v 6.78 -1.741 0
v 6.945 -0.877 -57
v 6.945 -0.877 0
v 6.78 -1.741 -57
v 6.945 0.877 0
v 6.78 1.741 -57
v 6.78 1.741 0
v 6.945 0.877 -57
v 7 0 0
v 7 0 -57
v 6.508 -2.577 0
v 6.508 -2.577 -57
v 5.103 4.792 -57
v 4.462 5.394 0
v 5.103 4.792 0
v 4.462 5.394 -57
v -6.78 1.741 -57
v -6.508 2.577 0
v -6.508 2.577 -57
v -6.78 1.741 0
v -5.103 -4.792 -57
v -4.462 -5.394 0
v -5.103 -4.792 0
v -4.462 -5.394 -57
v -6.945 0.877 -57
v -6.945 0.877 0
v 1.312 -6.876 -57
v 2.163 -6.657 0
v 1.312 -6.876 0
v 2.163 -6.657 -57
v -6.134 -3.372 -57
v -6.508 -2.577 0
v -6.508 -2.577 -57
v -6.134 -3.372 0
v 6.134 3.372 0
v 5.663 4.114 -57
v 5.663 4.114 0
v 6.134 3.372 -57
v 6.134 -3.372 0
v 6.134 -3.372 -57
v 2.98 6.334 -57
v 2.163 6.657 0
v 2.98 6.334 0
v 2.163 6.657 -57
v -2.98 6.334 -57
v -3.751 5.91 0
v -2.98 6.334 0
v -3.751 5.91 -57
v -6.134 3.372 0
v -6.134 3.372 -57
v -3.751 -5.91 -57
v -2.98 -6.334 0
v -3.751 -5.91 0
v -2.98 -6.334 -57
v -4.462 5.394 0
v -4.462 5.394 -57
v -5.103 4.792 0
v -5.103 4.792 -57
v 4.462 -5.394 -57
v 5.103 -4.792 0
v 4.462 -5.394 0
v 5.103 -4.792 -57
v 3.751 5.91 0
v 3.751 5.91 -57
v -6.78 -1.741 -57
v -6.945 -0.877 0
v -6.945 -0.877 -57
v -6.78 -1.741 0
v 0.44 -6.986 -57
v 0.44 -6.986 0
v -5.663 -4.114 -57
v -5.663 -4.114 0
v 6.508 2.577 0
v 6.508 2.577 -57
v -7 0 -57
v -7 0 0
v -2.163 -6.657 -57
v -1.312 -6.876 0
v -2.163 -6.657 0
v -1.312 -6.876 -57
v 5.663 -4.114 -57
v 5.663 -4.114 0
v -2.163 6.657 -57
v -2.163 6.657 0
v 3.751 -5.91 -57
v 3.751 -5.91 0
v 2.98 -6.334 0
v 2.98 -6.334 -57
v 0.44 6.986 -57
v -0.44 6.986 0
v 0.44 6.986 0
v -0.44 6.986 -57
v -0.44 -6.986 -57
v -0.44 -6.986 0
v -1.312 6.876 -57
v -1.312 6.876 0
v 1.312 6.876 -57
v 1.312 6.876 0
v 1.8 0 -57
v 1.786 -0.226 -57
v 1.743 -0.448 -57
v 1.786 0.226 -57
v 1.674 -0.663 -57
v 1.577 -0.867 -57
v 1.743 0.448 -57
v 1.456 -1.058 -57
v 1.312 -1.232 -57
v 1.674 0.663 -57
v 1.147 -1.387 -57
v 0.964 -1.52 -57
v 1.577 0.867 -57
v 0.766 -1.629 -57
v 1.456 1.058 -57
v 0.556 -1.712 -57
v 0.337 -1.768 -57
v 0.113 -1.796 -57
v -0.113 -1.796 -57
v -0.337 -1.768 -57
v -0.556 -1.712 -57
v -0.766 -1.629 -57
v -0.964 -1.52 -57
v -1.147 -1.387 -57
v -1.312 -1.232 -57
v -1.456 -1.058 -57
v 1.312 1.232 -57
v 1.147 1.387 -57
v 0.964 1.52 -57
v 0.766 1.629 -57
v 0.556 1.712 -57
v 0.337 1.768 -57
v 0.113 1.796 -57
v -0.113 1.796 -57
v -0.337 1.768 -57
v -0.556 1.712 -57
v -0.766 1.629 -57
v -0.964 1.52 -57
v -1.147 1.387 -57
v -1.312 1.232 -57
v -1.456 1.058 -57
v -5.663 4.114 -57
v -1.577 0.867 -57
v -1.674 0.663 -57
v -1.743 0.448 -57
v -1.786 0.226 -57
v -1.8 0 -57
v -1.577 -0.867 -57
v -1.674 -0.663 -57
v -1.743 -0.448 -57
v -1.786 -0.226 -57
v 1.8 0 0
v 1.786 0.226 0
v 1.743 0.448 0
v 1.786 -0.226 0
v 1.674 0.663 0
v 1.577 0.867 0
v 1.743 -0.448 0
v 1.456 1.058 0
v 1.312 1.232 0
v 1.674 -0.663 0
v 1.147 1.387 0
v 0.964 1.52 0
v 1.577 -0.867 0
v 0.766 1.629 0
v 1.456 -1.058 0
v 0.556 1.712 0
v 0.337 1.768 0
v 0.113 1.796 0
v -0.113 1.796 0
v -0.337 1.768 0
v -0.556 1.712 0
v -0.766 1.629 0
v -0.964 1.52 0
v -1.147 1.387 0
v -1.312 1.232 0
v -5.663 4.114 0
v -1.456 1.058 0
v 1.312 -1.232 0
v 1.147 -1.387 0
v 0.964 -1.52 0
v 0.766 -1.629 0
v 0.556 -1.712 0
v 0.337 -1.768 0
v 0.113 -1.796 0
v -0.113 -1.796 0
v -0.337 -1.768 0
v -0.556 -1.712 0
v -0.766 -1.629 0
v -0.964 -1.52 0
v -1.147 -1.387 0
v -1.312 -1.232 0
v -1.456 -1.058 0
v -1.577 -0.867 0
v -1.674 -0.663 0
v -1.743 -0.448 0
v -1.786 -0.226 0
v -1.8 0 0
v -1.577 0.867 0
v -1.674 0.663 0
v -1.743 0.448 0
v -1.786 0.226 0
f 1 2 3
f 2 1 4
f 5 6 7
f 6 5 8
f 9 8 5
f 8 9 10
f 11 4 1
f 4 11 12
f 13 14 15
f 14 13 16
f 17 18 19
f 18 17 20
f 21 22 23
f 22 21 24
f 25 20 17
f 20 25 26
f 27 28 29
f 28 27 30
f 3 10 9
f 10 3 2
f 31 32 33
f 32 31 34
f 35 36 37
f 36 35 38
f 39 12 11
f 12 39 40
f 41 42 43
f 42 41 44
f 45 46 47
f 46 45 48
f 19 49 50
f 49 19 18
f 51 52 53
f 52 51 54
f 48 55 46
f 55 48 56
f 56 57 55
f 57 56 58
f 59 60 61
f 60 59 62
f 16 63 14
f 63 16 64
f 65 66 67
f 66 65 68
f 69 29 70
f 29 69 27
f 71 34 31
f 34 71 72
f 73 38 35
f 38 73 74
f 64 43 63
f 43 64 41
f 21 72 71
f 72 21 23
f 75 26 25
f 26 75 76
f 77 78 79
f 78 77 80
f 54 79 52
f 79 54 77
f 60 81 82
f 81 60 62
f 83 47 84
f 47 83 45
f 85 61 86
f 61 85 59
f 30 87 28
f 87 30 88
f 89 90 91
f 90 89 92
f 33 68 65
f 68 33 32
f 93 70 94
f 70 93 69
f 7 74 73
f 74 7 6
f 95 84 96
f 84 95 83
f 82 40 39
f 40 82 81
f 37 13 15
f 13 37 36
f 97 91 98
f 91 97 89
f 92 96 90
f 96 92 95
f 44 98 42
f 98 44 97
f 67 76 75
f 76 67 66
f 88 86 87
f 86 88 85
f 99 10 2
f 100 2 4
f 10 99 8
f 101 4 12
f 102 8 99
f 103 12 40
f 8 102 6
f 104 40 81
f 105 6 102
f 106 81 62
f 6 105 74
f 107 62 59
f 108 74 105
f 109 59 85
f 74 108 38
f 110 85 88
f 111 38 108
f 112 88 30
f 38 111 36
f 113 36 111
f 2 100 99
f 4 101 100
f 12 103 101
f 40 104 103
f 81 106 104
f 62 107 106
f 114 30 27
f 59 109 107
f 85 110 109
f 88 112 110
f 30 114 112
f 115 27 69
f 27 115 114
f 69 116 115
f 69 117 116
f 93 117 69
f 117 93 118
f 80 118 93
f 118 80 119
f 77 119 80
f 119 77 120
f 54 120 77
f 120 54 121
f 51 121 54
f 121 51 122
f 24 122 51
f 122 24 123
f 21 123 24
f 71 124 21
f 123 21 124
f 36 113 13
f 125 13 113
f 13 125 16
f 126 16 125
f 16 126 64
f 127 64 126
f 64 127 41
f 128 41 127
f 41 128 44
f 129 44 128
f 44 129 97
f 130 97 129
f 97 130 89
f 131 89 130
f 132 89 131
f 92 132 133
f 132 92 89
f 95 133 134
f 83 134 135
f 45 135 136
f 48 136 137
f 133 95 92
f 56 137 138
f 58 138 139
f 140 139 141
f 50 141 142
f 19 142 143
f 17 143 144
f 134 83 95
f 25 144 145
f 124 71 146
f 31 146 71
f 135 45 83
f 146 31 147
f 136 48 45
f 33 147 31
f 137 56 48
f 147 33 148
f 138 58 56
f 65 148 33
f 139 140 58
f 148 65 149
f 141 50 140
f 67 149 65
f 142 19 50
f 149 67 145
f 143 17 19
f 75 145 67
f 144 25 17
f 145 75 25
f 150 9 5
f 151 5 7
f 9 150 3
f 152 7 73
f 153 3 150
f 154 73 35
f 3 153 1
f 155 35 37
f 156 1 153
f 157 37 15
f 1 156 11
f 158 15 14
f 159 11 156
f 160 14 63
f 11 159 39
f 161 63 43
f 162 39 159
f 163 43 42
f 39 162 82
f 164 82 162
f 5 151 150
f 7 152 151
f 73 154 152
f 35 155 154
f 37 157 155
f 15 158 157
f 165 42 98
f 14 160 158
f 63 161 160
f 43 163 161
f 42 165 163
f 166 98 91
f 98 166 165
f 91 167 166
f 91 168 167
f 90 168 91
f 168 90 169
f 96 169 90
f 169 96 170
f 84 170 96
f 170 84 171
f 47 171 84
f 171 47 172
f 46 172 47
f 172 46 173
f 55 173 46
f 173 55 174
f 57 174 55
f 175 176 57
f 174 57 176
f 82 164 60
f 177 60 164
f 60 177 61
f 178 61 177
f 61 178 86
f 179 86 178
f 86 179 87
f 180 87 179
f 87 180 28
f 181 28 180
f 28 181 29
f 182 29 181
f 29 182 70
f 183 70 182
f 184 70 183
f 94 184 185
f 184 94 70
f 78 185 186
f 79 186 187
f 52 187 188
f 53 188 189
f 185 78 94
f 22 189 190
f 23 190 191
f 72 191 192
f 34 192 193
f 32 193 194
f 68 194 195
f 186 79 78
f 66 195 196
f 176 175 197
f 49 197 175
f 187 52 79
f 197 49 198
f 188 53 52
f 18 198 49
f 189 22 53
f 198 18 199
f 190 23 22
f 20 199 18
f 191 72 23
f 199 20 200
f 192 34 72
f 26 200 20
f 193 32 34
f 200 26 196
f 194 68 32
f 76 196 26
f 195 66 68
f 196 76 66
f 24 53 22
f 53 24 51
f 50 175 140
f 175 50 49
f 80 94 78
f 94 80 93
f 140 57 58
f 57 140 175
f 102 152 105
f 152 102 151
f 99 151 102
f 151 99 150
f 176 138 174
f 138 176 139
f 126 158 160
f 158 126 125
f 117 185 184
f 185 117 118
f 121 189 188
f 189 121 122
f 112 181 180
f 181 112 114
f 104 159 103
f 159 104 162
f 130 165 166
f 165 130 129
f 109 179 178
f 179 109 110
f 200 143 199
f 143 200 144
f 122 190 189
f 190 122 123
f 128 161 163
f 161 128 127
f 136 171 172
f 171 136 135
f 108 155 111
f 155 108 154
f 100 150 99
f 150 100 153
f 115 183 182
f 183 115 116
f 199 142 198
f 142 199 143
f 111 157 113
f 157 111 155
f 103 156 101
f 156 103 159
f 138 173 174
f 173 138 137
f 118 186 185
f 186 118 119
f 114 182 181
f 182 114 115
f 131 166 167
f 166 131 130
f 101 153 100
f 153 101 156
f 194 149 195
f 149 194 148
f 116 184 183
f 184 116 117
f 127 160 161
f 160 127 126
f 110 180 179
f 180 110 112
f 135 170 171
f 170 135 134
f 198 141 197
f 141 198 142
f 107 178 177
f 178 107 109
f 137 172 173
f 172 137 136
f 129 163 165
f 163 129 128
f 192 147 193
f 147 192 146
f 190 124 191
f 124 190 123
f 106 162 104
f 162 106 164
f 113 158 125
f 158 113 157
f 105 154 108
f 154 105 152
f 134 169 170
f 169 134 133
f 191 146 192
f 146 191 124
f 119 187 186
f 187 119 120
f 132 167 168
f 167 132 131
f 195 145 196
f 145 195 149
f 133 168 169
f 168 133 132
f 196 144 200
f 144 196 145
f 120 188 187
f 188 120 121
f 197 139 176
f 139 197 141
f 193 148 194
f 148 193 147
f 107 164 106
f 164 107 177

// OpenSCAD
$fn = 50;


difference() {
	union() {
		translate(v = [0, 0, -57.0000000000]) {
			cylinder(h = 57, r = 7.0000000000);
		}
		cylinder(h = 0, r = 17.0000000000);
	}
	union() {
		#translate(v = [0, 0, -57]) {
			cylinder(h = 57, r = 1.8000000000);
		}
	}
}
